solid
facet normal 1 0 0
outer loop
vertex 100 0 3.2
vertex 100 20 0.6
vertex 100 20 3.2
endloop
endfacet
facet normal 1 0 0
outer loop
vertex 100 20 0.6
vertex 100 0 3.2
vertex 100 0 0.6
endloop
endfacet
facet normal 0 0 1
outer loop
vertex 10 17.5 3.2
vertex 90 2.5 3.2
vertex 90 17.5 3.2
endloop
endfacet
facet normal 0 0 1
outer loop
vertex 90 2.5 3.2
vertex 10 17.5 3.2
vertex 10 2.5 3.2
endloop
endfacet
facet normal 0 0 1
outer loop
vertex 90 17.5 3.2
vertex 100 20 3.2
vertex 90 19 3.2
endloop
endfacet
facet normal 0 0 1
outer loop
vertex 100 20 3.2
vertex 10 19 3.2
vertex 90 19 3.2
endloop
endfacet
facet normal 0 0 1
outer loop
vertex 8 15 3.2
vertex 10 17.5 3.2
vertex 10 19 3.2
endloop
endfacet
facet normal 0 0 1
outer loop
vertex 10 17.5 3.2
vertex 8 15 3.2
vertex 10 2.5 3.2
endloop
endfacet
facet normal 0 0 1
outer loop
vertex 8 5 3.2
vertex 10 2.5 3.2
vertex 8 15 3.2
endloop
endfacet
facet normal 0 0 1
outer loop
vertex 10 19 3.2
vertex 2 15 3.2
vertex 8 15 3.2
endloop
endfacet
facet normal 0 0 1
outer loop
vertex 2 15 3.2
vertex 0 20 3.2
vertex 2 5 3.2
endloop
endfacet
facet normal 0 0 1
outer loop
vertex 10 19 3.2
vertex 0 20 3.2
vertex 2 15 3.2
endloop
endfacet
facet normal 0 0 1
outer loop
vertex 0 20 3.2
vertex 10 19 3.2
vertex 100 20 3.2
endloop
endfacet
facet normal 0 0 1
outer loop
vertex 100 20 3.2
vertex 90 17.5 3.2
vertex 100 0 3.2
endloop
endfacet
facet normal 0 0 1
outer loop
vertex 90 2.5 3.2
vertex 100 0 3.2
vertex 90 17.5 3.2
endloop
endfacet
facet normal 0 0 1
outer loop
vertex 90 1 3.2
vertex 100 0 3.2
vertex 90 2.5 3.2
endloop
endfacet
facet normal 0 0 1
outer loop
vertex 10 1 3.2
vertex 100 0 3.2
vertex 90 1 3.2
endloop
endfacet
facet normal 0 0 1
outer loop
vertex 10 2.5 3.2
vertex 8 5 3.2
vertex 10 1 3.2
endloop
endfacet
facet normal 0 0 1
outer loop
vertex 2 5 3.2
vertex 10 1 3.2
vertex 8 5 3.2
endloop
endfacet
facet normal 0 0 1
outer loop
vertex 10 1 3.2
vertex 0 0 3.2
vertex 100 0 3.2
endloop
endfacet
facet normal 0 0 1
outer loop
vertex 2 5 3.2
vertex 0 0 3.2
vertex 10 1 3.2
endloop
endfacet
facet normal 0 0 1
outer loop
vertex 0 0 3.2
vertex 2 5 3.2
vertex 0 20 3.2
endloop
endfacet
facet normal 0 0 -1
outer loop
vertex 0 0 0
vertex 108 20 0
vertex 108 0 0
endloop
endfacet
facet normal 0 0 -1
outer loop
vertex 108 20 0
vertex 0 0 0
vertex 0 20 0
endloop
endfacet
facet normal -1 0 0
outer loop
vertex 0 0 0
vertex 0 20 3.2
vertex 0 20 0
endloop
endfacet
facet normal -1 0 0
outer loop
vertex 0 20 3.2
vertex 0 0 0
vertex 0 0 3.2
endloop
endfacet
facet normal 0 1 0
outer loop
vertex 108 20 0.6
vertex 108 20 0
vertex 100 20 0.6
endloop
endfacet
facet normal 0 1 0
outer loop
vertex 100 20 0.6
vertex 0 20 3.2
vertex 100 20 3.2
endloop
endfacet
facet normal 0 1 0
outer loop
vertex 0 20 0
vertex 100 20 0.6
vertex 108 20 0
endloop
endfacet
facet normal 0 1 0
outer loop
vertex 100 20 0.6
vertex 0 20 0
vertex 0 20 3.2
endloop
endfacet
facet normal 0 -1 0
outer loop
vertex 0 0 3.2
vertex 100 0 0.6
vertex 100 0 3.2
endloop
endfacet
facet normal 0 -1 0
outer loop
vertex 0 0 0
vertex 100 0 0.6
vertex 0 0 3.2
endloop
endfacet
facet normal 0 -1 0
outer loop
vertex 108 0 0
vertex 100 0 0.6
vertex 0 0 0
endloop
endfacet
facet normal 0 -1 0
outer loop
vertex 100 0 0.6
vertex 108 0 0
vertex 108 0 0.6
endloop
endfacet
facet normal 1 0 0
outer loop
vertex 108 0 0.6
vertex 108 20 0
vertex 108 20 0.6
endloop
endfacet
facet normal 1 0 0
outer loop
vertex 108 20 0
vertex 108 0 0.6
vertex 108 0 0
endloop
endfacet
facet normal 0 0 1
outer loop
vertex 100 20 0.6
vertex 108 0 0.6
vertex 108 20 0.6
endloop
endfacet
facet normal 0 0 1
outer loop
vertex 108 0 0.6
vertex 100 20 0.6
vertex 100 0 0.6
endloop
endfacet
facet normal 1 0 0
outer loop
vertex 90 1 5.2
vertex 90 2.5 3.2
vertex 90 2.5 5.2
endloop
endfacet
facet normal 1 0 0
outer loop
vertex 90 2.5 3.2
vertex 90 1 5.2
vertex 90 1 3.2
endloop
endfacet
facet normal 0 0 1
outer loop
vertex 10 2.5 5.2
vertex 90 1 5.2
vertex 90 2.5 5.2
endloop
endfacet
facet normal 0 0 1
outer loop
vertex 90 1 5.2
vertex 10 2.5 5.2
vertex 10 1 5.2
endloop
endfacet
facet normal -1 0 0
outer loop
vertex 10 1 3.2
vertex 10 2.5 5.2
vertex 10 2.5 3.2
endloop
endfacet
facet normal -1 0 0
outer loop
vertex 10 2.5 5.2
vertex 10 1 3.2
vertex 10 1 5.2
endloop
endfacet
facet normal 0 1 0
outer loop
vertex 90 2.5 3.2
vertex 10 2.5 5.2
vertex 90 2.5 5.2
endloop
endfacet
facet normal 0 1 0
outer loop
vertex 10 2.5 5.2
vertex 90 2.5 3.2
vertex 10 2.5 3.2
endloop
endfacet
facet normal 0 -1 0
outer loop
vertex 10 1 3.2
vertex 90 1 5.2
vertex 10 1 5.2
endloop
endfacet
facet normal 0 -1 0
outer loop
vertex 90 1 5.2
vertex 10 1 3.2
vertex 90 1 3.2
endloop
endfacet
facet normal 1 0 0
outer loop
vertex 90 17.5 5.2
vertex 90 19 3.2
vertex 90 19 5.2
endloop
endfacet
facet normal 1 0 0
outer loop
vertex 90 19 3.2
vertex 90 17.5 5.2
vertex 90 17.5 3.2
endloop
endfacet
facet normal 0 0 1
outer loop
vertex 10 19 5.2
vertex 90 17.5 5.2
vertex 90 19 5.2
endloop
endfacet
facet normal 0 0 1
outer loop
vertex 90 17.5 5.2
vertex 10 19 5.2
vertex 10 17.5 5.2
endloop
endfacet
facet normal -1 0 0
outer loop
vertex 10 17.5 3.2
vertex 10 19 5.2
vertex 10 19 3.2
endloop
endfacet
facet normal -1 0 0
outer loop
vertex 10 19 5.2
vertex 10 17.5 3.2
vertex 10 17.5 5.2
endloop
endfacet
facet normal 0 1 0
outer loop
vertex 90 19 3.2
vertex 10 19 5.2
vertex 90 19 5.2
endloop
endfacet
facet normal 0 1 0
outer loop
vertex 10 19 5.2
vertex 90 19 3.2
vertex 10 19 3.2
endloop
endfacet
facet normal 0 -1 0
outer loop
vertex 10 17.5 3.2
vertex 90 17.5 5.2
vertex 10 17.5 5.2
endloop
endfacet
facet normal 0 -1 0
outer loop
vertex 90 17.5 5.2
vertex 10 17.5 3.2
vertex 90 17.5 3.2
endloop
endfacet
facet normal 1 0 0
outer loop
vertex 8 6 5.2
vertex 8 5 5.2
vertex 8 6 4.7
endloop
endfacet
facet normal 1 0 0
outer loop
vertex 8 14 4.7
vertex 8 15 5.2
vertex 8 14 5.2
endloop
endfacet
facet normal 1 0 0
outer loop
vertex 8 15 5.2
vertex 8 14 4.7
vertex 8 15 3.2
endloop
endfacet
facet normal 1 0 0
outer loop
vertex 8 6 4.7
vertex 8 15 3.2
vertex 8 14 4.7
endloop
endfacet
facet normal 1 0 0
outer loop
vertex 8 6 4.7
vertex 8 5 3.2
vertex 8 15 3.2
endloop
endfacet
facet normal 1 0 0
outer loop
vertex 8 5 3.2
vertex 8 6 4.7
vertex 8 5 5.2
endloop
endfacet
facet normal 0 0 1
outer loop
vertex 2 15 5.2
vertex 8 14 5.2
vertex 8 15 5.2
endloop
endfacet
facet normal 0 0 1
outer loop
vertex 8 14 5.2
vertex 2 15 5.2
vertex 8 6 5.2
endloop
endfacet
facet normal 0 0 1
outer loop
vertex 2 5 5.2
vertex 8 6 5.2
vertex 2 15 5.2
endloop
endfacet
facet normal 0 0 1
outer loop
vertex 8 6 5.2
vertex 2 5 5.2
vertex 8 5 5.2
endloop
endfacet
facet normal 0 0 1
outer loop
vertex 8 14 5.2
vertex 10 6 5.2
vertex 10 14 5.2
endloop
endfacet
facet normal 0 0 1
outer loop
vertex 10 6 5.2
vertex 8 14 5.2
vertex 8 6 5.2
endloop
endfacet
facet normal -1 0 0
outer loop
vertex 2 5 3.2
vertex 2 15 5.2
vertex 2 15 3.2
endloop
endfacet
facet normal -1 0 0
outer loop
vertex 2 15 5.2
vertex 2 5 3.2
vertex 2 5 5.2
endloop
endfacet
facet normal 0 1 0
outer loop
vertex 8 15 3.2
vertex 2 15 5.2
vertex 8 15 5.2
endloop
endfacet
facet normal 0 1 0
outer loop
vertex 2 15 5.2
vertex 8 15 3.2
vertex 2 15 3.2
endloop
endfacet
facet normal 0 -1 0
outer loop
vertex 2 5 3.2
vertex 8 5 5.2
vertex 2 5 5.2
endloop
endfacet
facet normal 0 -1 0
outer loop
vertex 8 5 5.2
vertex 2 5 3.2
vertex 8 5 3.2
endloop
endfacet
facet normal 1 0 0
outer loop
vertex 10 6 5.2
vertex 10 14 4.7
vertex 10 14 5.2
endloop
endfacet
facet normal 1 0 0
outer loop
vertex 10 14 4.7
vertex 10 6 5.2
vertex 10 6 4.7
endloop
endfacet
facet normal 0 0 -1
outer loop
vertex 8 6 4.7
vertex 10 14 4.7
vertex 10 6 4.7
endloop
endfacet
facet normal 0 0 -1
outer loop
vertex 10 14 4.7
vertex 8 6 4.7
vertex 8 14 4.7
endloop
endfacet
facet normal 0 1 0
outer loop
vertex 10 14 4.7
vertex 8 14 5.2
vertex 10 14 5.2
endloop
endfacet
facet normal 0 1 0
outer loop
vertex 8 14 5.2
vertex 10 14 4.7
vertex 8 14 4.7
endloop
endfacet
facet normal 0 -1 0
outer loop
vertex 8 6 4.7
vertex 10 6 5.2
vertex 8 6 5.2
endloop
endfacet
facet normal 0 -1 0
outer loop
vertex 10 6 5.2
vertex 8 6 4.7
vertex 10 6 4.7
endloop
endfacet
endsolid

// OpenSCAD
// Bag clip living hinge, PETG, 0.4 nozzle, no supports.
// Two halves contacting at hinge, open flat print pose.
// Fold: rotate upper 180 about [108,10,5.2] -Y. F(x)=216-x, F(z)=10.4-z.

part = "arm_lower"; // [arm_lower, arm_upper, assembly]
cadverify_only = "";

module instance(name, part, unit = 1) {
    echo(cadverify_instance = [name, part, unit]);
    if (cadverify_only == "" || cadverify_only == name) children();
}

module arm_lower() {
    cube([100, 20, 3.2], false);
    translate([99.9, 0, 0]) cube([8.1, 20, 0.6], false);
    translate([10, 1, 3.1]) cube([80, 1.5, 2.1], false);
    translate([10, 17.5, 3.1]) cube([80, 1.5, 2.1], false);
    translate([2, 5, 3.1]) cube([6, 10, 2.1], false);
    translate([7.9, 6, 4.7]) cube([2.1, 8, 0.5], false);
}

module arm_upper() {
    cube([8.1, 20, 0.6], false);
    translate([7.9, 0, 0]) cube([100.1, 20, 3.2], false);
    translate([100, 5, 3.1]) cube([6, 10, 2.1], false);
    translate([97.9, 6, 4.7]) cube([2.5, 8, 0.5], false);
    translate([107.9, 6, 0]) cube([8.1, 8, 3.2], false);
}

if (part == "arm_lower") {
    echo(cadverify_spec = [
        ["bounds", [[0, 0, 0], [108, 20, 5.2]]],
        ["bodies", 1],
        ["through_holes", 0],
        ["support_faces", [["bed", "-z", 1500]]],
        ["overhangs_allowed", [["latch lip", [[7.5, 5.5, 4.5], [10.5, 14.5, 5.5]]]]],
        ["copies", 1],
        ["details", [
            ["arm", "material", [[30, 8, 1.2], [70, 12, 2.0]], 1],
            ["arm_wall", "thickness", [50, 10, 10], [0, 0, -1], 3.2],
            ["hinge", "thickness", [104, 10, 5], [0, 0, -1], 0.6],
            ["rib", "material", [[30, 1.3, 3.8], [70, 2.2, 4.8]], 1],
            ["rib2", "material", [[30, 17.8, 3.8], [70, 18.7, 4.8]], 1],
            ["latch_tower", "material", [[3, 7, 3.8], [7, 13, 5.0]], 1],
            ["latch_lip", "material", [[8.3, 7, 4.8], [9.6, 13, 5.1]], 1],
            ["bag_slot", "void", [[30, 4, 3.8], [70, 16, 5.0]], 1]
        ]]
    ]);
    arm_lower();
} else if (part == "arm_upper") {
    echo(cadverify_spec = [
        ["bounds", [[0, 0, 0], [116, 20, 5.2]]],
        ["bodies", 1],
        ["through_holes", 0],
        ["support_faces", [["bed", "-z", 1500]]],
        ["overhangs_allowed", [["latch lip", [[97.5, 5.5, 4.5], [100.8, 14.5, 5.5]]]]],
        ["copies", 1],
        ["details", [
            ["arm", "material", [[30, 8, 1.2], [70, 12, 2.0]], 1],
            ["arm_wall", "thickness", [50, 10, 10], [0, 0, -1], 3.2],
            ["hinge", "thickness", [4, 10, 5], [0, 0, -1], 0.6],
            ["latch_tower", "material", [[100.5, 7, 3.8], [105.5, 13, 5.0]], 1],
            ["latch_lip", "material", [[98.3, 7, 4.8], [100.0, 13, 5.1]], 1],
            ["thumb_tab", "material", [[109, 7, 1.2], [114, 13, 2.0]], 1],
            ["field", "void", [[30, 4, 3.8], [70, 16, 5.0]], 1]
        ]]
    ]);
    arm_upper();
} else if (part == "assembly") {
    echo(cadverify_spec = [
        ["bounds", [[0, 0, 0], [224, 20, 5.2]]],
        ["support_faces", [["bed", "-z", 3000]]],
        ["motions", [
            ["close", ["upper"], "rotate", [108, 10, 5.2], [0, -1, 0], [0, 180],
                ["flex", [["upper", "lower", 1.0, "latch snap"]]],
                ["stops", [180]],
                ["rests", [0, 180]]
            ]
        ]],
        ["assembly_order", [
            [["lower"], [0, 0, 0]],
            [["upper"], [0, 0, -1]]
        ]]
    ]);
    instance("lower", "arm_lower") arm_lower();
    instance("upper", "arm_upper") translate([108, 0, 0]) arm_upper();
}
